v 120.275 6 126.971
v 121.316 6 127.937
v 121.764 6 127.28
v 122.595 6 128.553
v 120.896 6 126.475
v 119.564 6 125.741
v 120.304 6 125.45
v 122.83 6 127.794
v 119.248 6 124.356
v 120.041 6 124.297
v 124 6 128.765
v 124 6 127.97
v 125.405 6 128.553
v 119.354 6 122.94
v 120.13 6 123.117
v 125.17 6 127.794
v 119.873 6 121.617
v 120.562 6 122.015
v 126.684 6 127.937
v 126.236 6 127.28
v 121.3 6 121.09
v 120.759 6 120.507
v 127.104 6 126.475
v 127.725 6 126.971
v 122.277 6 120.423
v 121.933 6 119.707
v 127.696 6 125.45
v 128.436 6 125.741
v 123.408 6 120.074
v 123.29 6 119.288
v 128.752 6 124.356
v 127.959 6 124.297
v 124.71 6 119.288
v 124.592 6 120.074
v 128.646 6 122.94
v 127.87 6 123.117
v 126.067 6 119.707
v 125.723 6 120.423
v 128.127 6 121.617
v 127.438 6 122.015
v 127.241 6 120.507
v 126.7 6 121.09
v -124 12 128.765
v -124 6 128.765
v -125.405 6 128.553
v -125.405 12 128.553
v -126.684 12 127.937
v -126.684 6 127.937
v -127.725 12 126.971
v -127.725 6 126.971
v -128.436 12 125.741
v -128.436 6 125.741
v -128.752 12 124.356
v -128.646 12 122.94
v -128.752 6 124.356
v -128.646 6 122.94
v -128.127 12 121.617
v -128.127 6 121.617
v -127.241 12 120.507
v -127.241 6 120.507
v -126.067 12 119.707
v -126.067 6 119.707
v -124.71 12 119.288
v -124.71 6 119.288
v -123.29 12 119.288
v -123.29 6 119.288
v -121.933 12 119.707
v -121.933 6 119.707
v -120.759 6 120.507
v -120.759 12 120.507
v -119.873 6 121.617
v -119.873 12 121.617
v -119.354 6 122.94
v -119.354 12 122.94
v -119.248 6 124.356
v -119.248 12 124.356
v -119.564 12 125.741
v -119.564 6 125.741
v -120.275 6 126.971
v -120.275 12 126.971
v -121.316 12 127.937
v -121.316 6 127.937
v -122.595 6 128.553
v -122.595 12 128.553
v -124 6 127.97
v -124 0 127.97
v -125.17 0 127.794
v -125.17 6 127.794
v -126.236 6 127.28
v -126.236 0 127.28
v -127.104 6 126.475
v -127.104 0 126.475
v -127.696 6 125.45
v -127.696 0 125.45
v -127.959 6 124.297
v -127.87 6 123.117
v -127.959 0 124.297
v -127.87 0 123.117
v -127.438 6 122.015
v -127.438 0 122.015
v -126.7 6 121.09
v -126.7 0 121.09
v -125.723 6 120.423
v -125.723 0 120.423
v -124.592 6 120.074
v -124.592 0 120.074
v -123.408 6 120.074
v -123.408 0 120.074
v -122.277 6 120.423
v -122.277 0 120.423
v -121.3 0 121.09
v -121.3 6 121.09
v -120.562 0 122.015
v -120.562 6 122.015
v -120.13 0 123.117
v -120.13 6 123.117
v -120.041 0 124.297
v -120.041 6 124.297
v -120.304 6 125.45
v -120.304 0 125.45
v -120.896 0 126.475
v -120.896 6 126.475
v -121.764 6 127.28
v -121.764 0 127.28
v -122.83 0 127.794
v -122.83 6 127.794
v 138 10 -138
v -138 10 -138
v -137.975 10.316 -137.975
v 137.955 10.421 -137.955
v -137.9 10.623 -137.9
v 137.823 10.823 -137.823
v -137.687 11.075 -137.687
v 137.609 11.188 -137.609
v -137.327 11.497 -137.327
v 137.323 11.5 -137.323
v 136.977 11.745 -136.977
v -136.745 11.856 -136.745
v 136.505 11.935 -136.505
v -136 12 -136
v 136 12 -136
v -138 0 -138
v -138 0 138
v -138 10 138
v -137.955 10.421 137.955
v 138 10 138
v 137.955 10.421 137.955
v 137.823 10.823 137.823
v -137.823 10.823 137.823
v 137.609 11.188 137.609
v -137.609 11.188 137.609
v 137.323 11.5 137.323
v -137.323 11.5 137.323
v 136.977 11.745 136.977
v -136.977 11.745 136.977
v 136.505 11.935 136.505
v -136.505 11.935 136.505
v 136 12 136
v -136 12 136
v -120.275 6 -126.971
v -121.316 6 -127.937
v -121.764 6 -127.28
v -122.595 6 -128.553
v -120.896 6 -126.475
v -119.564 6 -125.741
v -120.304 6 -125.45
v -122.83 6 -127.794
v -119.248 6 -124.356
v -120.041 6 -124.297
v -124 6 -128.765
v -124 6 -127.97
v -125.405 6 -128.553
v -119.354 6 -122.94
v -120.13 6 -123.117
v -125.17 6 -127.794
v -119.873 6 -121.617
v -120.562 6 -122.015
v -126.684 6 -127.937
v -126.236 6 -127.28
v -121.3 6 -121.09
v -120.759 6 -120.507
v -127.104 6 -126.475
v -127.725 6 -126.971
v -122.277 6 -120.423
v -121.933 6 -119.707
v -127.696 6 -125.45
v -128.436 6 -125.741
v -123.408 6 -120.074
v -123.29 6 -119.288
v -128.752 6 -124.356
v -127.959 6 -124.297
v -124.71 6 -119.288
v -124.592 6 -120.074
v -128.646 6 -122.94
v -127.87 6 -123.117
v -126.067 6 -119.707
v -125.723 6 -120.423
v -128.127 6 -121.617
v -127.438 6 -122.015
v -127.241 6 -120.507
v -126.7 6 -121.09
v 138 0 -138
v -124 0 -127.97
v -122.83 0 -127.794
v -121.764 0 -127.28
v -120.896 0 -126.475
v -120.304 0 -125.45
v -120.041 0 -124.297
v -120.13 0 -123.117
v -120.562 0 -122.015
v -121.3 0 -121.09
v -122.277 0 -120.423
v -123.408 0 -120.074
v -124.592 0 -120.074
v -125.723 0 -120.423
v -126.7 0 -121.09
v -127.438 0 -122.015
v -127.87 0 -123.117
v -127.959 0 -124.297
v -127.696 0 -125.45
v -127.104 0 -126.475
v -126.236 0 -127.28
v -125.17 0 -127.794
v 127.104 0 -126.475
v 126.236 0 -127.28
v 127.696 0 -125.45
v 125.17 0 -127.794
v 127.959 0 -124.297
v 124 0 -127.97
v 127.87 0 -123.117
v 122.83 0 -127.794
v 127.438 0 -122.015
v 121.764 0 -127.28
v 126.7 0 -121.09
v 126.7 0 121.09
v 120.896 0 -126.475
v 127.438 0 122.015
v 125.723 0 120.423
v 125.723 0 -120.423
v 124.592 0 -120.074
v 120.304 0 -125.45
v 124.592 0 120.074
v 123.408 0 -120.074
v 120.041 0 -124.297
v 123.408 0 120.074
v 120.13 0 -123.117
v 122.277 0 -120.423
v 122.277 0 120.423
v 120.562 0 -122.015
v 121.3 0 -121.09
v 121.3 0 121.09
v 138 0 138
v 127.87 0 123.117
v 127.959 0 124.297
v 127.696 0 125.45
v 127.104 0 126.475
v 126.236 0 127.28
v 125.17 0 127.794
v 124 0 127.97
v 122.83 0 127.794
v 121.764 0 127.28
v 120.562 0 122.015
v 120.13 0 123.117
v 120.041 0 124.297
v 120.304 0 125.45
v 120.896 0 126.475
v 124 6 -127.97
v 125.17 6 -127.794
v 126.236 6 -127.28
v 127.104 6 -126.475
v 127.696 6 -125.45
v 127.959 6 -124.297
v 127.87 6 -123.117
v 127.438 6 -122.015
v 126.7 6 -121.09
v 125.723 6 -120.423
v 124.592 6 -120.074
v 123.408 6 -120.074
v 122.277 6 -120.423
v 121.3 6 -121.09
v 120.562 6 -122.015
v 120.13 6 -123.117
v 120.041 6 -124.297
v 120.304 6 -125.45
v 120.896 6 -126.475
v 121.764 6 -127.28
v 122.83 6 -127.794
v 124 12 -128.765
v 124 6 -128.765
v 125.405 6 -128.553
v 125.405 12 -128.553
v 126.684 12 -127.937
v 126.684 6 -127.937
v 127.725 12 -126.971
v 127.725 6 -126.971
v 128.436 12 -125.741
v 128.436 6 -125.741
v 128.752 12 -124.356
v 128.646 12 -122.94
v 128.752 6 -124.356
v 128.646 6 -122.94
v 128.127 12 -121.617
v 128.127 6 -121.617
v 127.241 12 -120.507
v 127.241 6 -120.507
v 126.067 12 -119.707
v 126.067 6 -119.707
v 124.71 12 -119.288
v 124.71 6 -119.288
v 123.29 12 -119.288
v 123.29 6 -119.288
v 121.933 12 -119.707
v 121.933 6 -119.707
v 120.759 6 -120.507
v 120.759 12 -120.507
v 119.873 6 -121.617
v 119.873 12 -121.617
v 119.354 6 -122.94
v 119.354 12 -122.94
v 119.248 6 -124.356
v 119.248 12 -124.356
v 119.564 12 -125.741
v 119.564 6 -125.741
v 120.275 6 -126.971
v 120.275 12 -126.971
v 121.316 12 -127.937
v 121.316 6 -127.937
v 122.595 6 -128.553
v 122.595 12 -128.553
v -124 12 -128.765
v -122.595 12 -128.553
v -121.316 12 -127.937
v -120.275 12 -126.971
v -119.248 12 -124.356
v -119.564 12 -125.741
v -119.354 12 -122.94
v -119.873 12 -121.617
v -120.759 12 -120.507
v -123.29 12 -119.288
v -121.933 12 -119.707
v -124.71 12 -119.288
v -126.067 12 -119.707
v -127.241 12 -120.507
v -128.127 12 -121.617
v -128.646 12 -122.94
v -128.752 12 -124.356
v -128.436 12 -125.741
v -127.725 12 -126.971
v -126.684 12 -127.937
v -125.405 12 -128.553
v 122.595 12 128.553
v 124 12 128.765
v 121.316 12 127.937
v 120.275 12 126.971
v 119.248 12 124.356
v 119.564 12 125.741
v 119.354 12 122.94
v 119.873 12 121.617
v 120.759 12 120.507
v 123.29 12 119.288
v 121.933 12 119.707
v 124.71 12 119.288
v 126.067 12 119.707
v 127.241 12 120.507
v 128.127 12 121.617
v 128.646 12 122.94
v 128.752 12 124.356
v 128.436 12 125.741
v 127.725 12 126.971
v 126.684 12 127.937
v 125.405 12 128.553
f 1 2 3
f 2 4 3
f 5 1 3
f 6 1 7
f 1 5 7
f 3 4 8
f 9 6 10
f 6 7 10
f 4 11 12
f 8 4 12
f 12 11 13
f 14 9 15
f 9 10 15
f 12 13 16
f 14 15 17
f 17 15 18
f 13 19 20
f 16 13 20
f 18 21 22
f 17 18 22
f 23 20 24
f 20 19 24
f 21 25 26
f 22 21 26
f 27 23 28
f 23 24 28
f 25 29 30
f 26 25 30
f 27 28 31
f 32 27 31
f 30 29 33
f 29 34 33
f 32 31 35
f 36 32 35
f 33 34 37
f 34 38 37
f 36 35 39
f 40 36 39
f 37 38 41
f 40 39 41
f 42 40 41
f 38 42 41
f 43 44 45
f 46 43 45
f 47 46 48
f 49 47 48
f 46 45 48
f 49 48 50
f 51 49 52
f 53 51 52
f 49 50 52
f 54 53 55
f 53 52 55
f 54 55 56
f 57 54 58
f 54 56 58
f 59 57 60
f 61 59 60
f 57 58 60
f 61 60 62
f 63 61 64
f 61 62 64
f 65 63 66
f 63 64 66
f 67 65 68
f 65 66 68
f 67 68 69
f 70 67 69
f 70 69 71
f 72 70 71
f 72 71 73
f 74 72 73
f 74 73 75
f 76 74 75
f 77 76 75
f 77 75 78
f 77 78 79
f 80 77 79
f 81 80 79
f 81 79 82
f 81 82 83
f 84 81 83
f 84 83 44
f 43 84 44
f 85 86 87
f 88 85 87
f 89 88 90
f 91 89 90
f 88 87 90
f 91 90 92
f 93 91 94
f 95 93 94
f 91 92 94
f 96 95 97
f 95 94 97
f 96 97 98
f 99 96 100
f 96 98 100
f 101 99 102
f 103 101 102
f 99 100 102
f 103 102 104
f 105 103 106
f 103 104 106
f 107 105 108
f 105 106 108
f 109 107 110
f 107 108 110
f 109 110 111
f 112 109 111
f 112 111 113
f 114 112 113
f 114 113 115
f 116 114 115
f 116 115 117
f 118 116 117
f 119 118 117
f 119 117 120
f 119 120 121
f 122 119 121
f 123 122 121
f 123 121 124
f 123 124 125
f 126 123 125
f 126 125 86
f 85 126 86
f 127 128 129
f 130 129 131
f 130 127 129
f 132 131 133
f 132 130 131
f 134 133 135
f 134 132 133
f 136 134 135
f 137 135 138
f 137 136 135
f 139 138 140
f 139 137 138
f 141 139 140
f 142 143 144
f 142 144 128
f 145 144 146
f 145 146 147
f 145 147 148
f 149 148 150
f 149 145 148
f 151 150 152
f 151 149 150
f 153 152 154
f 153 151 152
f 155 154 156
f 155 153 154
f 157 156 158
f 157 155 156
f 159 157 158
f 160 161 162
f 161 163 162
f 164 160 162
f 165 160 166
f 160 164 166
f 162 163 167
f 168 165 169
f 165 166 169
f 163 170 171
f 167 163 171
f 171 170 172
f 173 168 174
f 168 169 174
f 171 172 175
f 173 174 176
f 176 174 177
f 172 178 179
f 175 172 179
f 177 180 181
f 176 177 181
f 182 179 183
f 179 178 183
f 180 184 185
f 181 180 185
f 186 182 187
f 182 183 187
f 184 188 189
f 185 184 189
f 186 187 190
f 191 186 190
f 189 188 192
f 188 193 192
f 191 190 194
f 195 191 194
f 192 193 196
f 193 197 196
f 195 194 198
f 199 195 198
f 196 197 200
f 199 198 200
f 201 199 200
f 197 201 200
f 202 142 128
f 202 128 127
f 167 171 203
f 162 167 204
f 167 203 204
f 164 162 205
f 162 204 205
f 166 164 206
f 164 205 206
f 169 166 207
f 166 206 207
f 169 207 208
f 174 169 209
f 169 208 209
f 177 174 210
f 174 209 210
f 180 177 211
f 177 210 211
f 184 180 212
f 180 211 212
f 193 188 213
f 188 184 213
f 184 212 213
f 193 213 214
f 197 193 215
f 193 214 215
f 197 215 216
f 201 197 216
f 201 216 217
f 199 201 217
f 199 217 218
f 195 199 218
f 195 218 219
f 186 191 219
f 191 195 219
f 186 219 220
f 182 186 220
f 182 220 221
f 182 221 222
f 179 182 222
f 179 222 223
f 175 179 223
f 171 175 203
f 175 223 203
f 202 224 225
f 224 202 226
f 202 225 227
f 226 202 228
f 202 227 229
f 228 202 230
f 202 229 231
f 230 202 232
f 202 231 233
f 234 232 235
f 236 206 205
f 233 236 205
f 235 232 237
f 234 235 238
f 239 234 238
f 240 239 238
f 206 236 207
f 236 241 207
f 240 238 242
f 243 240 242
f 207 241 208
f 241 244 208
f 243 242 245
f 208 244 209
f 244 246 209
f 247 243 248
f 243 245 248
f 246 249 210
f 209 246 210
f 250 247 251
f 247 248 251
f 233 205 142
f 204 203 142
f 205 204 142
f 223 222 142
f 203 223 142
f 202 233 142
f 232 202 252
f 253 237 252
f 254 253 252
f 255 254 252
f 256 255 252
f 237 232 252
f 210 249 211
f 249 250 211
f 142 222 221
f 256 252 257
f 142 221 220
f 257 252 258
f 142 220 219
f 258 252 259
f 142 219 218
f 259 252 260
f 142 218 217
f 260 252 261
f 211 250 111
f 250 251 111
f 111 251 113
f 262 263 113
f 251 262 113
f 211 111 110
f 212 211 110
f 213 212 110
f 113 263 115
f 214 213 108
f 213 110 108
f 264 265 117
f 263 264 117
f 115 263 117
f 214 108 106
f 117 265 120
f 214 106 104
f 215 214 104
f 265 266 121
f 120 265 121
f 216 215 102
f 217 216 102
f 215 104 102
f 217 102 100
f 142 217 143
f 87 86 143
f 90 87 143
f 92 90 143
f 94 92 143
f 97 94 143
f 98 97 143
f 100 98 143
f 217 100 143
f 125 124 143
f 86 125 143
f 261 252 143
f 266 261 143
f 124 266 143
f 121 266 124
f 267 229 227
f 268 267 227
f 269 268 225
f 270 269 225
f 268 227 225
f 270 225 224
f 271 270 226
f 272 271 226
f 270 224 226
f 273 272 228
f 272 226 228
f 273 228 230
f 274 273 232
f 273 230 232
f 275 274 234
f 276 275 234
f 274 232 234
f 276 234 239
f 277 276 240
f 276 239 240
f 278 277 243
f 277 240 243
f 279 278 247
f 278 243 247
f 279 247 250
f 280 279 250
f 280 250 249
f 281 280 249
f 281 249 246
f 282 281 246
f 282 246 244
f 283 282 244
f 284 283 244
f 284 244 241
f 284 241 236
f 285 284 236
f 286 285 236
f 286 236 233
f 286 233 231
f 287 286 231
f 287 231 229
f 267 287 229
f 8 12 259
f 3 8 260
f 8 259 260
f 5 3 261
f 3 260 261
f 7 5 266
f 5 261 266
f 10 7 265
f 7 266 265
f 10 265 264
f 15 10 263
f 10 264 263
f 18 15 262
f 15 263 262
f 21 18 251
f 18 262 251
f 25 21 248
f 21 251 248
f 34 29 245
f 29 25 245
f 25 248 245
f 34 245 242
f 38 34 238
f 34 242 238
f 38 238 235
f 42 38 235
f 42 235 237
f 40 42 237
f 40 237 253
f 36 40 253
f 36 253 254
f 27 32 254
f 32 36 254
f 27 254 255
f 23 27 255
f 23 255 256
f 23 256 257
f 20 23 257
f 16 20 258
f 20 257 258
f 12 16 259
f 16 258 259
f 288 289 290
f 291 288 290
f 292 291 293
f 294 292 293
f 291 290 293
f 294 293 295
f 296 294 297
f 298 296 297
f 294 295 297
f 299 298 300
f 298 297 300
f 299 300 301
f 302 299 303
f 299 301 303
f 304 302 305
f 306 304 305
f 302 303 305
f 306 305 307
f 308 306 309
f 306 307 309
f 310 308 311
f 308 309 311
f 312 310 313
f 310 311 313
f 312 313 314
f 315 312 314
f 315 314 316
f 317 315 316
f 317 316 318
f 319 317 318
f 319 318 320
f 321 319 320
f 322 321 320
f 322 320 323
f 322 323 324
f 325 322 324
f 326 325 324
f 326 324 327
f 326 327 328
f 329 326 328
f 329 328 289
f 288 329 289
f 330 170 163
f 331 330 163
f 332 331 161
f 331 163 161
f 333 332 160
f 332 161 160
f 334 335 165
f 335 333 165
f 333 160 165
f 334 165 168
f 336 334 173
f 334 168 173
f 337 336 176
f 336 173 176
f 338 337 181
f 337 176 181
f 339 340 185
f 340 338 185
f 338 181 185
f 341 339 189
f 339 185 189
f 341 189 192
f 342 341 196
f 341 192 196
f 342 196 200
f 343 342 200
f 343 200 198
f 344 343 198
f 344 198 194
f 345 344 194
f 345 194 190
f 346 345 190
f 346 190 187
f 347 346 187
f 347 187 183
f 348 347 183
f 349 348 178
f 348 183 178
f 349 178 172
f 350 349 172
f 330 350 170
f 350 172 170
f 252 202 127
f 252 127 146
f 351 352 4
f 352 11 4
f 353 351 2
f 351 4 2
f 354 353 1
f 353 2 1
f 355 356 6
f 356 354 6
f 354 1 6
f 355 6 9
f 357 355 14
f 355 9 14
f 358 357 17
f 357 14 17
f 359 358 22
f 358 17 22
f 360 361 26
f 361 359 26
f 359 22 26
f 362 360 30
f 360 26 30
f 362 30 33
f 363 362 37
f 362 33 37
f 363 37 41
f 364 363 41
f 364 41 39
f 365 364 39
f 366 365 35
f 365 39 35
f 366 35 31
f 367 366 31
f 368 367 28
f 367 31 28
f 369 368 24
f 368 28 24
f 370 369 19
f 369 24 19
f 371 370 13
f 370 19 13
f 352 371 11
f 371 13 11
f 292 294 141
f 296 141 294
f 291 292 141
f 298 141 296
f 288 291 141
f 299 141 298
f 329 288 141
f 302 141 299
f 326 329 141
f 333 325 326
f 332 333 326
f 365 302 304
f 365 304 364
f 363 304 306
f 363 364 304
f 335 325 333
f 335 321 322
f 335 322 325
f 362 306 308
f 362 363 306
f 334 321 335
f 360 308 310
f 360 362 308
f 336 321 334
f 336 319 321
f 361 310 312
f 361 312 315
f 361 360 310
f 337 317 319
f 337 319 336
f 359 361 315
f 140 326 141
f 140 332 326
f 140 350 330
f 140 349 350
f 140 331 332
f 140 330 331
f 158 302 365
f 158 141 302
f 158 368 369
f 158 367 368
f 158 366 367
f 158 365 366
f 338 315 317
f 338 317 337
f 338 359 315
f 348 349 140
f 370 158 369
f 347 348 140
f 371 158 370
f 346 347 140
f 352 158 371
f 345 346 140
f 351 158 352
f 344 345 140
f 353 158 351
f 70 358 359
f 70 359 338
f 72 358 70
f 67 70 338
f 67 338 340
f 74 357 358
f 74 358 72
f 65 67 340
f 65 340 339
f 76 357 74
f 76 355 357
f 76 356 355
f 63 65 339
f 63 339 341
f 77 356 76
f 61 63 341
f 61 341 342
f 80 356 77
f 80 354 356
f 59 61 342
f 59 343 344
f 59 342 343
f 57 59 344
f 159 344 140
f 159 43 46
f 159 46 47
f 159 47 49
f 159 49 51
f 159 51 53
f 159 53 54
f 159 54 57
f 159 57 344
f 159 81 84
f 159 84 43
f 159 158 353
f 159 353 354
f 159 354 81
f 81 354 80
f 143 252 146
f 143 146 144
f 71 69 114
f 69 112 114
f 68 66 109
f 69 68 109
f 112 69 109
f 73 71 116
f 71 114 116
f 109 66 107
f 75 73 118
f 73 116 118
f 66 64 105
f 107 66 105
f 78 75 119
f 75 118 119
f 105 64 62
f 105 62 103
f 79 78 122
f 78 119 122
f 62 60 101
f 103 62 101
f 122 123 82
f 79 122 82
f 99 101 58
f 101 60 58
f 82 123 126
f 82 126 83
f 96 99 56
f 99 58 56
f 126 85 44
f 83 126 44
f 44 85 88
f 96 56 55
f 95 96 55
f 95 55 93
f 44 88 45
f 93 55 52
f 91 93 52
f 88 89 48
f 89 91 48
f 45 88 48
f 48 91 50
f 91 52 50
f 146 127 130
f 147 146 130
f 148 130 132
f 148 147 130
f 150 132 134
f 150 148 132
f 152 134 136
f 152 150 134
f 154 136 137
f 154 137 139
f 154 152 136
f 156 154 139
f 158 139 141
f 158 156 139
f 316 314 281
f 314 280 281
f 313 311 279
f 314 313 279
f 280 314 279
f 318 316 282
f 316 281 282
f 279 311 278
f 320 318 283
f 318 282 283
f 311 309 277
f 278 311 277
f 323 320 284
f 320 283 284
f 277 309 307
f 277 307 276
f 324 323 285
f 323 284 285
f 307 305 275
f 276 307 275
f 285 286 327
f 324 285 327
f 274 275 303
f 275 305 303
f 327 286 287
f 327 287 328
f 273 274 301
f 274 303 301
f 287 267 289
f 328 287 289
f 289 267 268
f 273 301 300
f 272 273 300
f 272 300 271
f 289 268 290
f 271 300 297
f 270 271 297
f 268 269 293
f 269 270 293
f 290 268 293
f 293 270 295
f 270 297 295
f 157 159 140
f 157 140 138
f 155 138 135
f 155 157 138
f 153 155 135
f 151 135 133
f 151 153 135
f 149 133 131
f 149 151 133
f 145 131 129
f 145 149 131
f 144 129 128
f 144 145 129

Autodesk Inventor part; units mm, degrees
ref_plane "YZ Plane" through (0, 0, 0) normal (1, 0, 0) x (0, 1, 0)
ref_plane "XZ Plane" through (0, 0, 0) normal (0, 1, 0) x (-1, 0, 0)
ref_plane "XY Plane" through (0, 0, 0) normal (0, 0, 1) x (1, 0, 0)
sketch "Sketch1" plane through (0, 0, 0) normal (0, 1, 0) x (-1, 0, 0)
  line L0 (-138, 138) -> (138, 138)
  line L1 (138, 138) -> (138, -138)
  line L2 (138, -138) -> (-138, -138)
  line L3 (-138, -138) -> (-138, 138)
  line L4 (-138, 138) -> (138, -138) construction
  line L5 (138, 138) -> (-138, -138) construction
  line L6 (138, 130.5) -> (130.5, 130.5)
  line L7 (130.5, 130.5) -> (130.5, 138)
  point P0 (0, 0)
  dimension "d0" = 276
  dimension "d1" = 276
  dimension "d18" = 7.5
extrude "Extrusion1" add sketch "Sketch1" along normal blind 12
sketch "Sketch3" plane through (0, 12, 0) normal (0, 1, 0) x (1, 0, 0)
  line L0 (-138, 138) -> (-138, -138) projected
  line L1 (-138, -138) -> (138, -138) projected
  point P0 (0, 0)
  point P1 (-124, -124)
  dimension "d21" = 14
  dimension "d22" = 14
hole "Hole2" at (-124, 12, 124) direction (0, -1, 0) diameter 7.94 end through all counterbore diameter 9.53 counterbore depth 6
mirror "Mirror1 Right" about plane through (0, 0, 0) normal (0, 0, 1) of "Hole2"
mirror "Mirror2 Bottom" about plane through (0, 0, 0) normal (1, 0, 0) of "Hole2", "Mirror1 Right"
fillet "Fillet1" radius 2 4 edges at (0, 12, 138) (-138, 12, 0) (138, 12, 0) (0, 12, -138)
properties part number "Arrow Panel" material "Polycarbonate, Clear"
